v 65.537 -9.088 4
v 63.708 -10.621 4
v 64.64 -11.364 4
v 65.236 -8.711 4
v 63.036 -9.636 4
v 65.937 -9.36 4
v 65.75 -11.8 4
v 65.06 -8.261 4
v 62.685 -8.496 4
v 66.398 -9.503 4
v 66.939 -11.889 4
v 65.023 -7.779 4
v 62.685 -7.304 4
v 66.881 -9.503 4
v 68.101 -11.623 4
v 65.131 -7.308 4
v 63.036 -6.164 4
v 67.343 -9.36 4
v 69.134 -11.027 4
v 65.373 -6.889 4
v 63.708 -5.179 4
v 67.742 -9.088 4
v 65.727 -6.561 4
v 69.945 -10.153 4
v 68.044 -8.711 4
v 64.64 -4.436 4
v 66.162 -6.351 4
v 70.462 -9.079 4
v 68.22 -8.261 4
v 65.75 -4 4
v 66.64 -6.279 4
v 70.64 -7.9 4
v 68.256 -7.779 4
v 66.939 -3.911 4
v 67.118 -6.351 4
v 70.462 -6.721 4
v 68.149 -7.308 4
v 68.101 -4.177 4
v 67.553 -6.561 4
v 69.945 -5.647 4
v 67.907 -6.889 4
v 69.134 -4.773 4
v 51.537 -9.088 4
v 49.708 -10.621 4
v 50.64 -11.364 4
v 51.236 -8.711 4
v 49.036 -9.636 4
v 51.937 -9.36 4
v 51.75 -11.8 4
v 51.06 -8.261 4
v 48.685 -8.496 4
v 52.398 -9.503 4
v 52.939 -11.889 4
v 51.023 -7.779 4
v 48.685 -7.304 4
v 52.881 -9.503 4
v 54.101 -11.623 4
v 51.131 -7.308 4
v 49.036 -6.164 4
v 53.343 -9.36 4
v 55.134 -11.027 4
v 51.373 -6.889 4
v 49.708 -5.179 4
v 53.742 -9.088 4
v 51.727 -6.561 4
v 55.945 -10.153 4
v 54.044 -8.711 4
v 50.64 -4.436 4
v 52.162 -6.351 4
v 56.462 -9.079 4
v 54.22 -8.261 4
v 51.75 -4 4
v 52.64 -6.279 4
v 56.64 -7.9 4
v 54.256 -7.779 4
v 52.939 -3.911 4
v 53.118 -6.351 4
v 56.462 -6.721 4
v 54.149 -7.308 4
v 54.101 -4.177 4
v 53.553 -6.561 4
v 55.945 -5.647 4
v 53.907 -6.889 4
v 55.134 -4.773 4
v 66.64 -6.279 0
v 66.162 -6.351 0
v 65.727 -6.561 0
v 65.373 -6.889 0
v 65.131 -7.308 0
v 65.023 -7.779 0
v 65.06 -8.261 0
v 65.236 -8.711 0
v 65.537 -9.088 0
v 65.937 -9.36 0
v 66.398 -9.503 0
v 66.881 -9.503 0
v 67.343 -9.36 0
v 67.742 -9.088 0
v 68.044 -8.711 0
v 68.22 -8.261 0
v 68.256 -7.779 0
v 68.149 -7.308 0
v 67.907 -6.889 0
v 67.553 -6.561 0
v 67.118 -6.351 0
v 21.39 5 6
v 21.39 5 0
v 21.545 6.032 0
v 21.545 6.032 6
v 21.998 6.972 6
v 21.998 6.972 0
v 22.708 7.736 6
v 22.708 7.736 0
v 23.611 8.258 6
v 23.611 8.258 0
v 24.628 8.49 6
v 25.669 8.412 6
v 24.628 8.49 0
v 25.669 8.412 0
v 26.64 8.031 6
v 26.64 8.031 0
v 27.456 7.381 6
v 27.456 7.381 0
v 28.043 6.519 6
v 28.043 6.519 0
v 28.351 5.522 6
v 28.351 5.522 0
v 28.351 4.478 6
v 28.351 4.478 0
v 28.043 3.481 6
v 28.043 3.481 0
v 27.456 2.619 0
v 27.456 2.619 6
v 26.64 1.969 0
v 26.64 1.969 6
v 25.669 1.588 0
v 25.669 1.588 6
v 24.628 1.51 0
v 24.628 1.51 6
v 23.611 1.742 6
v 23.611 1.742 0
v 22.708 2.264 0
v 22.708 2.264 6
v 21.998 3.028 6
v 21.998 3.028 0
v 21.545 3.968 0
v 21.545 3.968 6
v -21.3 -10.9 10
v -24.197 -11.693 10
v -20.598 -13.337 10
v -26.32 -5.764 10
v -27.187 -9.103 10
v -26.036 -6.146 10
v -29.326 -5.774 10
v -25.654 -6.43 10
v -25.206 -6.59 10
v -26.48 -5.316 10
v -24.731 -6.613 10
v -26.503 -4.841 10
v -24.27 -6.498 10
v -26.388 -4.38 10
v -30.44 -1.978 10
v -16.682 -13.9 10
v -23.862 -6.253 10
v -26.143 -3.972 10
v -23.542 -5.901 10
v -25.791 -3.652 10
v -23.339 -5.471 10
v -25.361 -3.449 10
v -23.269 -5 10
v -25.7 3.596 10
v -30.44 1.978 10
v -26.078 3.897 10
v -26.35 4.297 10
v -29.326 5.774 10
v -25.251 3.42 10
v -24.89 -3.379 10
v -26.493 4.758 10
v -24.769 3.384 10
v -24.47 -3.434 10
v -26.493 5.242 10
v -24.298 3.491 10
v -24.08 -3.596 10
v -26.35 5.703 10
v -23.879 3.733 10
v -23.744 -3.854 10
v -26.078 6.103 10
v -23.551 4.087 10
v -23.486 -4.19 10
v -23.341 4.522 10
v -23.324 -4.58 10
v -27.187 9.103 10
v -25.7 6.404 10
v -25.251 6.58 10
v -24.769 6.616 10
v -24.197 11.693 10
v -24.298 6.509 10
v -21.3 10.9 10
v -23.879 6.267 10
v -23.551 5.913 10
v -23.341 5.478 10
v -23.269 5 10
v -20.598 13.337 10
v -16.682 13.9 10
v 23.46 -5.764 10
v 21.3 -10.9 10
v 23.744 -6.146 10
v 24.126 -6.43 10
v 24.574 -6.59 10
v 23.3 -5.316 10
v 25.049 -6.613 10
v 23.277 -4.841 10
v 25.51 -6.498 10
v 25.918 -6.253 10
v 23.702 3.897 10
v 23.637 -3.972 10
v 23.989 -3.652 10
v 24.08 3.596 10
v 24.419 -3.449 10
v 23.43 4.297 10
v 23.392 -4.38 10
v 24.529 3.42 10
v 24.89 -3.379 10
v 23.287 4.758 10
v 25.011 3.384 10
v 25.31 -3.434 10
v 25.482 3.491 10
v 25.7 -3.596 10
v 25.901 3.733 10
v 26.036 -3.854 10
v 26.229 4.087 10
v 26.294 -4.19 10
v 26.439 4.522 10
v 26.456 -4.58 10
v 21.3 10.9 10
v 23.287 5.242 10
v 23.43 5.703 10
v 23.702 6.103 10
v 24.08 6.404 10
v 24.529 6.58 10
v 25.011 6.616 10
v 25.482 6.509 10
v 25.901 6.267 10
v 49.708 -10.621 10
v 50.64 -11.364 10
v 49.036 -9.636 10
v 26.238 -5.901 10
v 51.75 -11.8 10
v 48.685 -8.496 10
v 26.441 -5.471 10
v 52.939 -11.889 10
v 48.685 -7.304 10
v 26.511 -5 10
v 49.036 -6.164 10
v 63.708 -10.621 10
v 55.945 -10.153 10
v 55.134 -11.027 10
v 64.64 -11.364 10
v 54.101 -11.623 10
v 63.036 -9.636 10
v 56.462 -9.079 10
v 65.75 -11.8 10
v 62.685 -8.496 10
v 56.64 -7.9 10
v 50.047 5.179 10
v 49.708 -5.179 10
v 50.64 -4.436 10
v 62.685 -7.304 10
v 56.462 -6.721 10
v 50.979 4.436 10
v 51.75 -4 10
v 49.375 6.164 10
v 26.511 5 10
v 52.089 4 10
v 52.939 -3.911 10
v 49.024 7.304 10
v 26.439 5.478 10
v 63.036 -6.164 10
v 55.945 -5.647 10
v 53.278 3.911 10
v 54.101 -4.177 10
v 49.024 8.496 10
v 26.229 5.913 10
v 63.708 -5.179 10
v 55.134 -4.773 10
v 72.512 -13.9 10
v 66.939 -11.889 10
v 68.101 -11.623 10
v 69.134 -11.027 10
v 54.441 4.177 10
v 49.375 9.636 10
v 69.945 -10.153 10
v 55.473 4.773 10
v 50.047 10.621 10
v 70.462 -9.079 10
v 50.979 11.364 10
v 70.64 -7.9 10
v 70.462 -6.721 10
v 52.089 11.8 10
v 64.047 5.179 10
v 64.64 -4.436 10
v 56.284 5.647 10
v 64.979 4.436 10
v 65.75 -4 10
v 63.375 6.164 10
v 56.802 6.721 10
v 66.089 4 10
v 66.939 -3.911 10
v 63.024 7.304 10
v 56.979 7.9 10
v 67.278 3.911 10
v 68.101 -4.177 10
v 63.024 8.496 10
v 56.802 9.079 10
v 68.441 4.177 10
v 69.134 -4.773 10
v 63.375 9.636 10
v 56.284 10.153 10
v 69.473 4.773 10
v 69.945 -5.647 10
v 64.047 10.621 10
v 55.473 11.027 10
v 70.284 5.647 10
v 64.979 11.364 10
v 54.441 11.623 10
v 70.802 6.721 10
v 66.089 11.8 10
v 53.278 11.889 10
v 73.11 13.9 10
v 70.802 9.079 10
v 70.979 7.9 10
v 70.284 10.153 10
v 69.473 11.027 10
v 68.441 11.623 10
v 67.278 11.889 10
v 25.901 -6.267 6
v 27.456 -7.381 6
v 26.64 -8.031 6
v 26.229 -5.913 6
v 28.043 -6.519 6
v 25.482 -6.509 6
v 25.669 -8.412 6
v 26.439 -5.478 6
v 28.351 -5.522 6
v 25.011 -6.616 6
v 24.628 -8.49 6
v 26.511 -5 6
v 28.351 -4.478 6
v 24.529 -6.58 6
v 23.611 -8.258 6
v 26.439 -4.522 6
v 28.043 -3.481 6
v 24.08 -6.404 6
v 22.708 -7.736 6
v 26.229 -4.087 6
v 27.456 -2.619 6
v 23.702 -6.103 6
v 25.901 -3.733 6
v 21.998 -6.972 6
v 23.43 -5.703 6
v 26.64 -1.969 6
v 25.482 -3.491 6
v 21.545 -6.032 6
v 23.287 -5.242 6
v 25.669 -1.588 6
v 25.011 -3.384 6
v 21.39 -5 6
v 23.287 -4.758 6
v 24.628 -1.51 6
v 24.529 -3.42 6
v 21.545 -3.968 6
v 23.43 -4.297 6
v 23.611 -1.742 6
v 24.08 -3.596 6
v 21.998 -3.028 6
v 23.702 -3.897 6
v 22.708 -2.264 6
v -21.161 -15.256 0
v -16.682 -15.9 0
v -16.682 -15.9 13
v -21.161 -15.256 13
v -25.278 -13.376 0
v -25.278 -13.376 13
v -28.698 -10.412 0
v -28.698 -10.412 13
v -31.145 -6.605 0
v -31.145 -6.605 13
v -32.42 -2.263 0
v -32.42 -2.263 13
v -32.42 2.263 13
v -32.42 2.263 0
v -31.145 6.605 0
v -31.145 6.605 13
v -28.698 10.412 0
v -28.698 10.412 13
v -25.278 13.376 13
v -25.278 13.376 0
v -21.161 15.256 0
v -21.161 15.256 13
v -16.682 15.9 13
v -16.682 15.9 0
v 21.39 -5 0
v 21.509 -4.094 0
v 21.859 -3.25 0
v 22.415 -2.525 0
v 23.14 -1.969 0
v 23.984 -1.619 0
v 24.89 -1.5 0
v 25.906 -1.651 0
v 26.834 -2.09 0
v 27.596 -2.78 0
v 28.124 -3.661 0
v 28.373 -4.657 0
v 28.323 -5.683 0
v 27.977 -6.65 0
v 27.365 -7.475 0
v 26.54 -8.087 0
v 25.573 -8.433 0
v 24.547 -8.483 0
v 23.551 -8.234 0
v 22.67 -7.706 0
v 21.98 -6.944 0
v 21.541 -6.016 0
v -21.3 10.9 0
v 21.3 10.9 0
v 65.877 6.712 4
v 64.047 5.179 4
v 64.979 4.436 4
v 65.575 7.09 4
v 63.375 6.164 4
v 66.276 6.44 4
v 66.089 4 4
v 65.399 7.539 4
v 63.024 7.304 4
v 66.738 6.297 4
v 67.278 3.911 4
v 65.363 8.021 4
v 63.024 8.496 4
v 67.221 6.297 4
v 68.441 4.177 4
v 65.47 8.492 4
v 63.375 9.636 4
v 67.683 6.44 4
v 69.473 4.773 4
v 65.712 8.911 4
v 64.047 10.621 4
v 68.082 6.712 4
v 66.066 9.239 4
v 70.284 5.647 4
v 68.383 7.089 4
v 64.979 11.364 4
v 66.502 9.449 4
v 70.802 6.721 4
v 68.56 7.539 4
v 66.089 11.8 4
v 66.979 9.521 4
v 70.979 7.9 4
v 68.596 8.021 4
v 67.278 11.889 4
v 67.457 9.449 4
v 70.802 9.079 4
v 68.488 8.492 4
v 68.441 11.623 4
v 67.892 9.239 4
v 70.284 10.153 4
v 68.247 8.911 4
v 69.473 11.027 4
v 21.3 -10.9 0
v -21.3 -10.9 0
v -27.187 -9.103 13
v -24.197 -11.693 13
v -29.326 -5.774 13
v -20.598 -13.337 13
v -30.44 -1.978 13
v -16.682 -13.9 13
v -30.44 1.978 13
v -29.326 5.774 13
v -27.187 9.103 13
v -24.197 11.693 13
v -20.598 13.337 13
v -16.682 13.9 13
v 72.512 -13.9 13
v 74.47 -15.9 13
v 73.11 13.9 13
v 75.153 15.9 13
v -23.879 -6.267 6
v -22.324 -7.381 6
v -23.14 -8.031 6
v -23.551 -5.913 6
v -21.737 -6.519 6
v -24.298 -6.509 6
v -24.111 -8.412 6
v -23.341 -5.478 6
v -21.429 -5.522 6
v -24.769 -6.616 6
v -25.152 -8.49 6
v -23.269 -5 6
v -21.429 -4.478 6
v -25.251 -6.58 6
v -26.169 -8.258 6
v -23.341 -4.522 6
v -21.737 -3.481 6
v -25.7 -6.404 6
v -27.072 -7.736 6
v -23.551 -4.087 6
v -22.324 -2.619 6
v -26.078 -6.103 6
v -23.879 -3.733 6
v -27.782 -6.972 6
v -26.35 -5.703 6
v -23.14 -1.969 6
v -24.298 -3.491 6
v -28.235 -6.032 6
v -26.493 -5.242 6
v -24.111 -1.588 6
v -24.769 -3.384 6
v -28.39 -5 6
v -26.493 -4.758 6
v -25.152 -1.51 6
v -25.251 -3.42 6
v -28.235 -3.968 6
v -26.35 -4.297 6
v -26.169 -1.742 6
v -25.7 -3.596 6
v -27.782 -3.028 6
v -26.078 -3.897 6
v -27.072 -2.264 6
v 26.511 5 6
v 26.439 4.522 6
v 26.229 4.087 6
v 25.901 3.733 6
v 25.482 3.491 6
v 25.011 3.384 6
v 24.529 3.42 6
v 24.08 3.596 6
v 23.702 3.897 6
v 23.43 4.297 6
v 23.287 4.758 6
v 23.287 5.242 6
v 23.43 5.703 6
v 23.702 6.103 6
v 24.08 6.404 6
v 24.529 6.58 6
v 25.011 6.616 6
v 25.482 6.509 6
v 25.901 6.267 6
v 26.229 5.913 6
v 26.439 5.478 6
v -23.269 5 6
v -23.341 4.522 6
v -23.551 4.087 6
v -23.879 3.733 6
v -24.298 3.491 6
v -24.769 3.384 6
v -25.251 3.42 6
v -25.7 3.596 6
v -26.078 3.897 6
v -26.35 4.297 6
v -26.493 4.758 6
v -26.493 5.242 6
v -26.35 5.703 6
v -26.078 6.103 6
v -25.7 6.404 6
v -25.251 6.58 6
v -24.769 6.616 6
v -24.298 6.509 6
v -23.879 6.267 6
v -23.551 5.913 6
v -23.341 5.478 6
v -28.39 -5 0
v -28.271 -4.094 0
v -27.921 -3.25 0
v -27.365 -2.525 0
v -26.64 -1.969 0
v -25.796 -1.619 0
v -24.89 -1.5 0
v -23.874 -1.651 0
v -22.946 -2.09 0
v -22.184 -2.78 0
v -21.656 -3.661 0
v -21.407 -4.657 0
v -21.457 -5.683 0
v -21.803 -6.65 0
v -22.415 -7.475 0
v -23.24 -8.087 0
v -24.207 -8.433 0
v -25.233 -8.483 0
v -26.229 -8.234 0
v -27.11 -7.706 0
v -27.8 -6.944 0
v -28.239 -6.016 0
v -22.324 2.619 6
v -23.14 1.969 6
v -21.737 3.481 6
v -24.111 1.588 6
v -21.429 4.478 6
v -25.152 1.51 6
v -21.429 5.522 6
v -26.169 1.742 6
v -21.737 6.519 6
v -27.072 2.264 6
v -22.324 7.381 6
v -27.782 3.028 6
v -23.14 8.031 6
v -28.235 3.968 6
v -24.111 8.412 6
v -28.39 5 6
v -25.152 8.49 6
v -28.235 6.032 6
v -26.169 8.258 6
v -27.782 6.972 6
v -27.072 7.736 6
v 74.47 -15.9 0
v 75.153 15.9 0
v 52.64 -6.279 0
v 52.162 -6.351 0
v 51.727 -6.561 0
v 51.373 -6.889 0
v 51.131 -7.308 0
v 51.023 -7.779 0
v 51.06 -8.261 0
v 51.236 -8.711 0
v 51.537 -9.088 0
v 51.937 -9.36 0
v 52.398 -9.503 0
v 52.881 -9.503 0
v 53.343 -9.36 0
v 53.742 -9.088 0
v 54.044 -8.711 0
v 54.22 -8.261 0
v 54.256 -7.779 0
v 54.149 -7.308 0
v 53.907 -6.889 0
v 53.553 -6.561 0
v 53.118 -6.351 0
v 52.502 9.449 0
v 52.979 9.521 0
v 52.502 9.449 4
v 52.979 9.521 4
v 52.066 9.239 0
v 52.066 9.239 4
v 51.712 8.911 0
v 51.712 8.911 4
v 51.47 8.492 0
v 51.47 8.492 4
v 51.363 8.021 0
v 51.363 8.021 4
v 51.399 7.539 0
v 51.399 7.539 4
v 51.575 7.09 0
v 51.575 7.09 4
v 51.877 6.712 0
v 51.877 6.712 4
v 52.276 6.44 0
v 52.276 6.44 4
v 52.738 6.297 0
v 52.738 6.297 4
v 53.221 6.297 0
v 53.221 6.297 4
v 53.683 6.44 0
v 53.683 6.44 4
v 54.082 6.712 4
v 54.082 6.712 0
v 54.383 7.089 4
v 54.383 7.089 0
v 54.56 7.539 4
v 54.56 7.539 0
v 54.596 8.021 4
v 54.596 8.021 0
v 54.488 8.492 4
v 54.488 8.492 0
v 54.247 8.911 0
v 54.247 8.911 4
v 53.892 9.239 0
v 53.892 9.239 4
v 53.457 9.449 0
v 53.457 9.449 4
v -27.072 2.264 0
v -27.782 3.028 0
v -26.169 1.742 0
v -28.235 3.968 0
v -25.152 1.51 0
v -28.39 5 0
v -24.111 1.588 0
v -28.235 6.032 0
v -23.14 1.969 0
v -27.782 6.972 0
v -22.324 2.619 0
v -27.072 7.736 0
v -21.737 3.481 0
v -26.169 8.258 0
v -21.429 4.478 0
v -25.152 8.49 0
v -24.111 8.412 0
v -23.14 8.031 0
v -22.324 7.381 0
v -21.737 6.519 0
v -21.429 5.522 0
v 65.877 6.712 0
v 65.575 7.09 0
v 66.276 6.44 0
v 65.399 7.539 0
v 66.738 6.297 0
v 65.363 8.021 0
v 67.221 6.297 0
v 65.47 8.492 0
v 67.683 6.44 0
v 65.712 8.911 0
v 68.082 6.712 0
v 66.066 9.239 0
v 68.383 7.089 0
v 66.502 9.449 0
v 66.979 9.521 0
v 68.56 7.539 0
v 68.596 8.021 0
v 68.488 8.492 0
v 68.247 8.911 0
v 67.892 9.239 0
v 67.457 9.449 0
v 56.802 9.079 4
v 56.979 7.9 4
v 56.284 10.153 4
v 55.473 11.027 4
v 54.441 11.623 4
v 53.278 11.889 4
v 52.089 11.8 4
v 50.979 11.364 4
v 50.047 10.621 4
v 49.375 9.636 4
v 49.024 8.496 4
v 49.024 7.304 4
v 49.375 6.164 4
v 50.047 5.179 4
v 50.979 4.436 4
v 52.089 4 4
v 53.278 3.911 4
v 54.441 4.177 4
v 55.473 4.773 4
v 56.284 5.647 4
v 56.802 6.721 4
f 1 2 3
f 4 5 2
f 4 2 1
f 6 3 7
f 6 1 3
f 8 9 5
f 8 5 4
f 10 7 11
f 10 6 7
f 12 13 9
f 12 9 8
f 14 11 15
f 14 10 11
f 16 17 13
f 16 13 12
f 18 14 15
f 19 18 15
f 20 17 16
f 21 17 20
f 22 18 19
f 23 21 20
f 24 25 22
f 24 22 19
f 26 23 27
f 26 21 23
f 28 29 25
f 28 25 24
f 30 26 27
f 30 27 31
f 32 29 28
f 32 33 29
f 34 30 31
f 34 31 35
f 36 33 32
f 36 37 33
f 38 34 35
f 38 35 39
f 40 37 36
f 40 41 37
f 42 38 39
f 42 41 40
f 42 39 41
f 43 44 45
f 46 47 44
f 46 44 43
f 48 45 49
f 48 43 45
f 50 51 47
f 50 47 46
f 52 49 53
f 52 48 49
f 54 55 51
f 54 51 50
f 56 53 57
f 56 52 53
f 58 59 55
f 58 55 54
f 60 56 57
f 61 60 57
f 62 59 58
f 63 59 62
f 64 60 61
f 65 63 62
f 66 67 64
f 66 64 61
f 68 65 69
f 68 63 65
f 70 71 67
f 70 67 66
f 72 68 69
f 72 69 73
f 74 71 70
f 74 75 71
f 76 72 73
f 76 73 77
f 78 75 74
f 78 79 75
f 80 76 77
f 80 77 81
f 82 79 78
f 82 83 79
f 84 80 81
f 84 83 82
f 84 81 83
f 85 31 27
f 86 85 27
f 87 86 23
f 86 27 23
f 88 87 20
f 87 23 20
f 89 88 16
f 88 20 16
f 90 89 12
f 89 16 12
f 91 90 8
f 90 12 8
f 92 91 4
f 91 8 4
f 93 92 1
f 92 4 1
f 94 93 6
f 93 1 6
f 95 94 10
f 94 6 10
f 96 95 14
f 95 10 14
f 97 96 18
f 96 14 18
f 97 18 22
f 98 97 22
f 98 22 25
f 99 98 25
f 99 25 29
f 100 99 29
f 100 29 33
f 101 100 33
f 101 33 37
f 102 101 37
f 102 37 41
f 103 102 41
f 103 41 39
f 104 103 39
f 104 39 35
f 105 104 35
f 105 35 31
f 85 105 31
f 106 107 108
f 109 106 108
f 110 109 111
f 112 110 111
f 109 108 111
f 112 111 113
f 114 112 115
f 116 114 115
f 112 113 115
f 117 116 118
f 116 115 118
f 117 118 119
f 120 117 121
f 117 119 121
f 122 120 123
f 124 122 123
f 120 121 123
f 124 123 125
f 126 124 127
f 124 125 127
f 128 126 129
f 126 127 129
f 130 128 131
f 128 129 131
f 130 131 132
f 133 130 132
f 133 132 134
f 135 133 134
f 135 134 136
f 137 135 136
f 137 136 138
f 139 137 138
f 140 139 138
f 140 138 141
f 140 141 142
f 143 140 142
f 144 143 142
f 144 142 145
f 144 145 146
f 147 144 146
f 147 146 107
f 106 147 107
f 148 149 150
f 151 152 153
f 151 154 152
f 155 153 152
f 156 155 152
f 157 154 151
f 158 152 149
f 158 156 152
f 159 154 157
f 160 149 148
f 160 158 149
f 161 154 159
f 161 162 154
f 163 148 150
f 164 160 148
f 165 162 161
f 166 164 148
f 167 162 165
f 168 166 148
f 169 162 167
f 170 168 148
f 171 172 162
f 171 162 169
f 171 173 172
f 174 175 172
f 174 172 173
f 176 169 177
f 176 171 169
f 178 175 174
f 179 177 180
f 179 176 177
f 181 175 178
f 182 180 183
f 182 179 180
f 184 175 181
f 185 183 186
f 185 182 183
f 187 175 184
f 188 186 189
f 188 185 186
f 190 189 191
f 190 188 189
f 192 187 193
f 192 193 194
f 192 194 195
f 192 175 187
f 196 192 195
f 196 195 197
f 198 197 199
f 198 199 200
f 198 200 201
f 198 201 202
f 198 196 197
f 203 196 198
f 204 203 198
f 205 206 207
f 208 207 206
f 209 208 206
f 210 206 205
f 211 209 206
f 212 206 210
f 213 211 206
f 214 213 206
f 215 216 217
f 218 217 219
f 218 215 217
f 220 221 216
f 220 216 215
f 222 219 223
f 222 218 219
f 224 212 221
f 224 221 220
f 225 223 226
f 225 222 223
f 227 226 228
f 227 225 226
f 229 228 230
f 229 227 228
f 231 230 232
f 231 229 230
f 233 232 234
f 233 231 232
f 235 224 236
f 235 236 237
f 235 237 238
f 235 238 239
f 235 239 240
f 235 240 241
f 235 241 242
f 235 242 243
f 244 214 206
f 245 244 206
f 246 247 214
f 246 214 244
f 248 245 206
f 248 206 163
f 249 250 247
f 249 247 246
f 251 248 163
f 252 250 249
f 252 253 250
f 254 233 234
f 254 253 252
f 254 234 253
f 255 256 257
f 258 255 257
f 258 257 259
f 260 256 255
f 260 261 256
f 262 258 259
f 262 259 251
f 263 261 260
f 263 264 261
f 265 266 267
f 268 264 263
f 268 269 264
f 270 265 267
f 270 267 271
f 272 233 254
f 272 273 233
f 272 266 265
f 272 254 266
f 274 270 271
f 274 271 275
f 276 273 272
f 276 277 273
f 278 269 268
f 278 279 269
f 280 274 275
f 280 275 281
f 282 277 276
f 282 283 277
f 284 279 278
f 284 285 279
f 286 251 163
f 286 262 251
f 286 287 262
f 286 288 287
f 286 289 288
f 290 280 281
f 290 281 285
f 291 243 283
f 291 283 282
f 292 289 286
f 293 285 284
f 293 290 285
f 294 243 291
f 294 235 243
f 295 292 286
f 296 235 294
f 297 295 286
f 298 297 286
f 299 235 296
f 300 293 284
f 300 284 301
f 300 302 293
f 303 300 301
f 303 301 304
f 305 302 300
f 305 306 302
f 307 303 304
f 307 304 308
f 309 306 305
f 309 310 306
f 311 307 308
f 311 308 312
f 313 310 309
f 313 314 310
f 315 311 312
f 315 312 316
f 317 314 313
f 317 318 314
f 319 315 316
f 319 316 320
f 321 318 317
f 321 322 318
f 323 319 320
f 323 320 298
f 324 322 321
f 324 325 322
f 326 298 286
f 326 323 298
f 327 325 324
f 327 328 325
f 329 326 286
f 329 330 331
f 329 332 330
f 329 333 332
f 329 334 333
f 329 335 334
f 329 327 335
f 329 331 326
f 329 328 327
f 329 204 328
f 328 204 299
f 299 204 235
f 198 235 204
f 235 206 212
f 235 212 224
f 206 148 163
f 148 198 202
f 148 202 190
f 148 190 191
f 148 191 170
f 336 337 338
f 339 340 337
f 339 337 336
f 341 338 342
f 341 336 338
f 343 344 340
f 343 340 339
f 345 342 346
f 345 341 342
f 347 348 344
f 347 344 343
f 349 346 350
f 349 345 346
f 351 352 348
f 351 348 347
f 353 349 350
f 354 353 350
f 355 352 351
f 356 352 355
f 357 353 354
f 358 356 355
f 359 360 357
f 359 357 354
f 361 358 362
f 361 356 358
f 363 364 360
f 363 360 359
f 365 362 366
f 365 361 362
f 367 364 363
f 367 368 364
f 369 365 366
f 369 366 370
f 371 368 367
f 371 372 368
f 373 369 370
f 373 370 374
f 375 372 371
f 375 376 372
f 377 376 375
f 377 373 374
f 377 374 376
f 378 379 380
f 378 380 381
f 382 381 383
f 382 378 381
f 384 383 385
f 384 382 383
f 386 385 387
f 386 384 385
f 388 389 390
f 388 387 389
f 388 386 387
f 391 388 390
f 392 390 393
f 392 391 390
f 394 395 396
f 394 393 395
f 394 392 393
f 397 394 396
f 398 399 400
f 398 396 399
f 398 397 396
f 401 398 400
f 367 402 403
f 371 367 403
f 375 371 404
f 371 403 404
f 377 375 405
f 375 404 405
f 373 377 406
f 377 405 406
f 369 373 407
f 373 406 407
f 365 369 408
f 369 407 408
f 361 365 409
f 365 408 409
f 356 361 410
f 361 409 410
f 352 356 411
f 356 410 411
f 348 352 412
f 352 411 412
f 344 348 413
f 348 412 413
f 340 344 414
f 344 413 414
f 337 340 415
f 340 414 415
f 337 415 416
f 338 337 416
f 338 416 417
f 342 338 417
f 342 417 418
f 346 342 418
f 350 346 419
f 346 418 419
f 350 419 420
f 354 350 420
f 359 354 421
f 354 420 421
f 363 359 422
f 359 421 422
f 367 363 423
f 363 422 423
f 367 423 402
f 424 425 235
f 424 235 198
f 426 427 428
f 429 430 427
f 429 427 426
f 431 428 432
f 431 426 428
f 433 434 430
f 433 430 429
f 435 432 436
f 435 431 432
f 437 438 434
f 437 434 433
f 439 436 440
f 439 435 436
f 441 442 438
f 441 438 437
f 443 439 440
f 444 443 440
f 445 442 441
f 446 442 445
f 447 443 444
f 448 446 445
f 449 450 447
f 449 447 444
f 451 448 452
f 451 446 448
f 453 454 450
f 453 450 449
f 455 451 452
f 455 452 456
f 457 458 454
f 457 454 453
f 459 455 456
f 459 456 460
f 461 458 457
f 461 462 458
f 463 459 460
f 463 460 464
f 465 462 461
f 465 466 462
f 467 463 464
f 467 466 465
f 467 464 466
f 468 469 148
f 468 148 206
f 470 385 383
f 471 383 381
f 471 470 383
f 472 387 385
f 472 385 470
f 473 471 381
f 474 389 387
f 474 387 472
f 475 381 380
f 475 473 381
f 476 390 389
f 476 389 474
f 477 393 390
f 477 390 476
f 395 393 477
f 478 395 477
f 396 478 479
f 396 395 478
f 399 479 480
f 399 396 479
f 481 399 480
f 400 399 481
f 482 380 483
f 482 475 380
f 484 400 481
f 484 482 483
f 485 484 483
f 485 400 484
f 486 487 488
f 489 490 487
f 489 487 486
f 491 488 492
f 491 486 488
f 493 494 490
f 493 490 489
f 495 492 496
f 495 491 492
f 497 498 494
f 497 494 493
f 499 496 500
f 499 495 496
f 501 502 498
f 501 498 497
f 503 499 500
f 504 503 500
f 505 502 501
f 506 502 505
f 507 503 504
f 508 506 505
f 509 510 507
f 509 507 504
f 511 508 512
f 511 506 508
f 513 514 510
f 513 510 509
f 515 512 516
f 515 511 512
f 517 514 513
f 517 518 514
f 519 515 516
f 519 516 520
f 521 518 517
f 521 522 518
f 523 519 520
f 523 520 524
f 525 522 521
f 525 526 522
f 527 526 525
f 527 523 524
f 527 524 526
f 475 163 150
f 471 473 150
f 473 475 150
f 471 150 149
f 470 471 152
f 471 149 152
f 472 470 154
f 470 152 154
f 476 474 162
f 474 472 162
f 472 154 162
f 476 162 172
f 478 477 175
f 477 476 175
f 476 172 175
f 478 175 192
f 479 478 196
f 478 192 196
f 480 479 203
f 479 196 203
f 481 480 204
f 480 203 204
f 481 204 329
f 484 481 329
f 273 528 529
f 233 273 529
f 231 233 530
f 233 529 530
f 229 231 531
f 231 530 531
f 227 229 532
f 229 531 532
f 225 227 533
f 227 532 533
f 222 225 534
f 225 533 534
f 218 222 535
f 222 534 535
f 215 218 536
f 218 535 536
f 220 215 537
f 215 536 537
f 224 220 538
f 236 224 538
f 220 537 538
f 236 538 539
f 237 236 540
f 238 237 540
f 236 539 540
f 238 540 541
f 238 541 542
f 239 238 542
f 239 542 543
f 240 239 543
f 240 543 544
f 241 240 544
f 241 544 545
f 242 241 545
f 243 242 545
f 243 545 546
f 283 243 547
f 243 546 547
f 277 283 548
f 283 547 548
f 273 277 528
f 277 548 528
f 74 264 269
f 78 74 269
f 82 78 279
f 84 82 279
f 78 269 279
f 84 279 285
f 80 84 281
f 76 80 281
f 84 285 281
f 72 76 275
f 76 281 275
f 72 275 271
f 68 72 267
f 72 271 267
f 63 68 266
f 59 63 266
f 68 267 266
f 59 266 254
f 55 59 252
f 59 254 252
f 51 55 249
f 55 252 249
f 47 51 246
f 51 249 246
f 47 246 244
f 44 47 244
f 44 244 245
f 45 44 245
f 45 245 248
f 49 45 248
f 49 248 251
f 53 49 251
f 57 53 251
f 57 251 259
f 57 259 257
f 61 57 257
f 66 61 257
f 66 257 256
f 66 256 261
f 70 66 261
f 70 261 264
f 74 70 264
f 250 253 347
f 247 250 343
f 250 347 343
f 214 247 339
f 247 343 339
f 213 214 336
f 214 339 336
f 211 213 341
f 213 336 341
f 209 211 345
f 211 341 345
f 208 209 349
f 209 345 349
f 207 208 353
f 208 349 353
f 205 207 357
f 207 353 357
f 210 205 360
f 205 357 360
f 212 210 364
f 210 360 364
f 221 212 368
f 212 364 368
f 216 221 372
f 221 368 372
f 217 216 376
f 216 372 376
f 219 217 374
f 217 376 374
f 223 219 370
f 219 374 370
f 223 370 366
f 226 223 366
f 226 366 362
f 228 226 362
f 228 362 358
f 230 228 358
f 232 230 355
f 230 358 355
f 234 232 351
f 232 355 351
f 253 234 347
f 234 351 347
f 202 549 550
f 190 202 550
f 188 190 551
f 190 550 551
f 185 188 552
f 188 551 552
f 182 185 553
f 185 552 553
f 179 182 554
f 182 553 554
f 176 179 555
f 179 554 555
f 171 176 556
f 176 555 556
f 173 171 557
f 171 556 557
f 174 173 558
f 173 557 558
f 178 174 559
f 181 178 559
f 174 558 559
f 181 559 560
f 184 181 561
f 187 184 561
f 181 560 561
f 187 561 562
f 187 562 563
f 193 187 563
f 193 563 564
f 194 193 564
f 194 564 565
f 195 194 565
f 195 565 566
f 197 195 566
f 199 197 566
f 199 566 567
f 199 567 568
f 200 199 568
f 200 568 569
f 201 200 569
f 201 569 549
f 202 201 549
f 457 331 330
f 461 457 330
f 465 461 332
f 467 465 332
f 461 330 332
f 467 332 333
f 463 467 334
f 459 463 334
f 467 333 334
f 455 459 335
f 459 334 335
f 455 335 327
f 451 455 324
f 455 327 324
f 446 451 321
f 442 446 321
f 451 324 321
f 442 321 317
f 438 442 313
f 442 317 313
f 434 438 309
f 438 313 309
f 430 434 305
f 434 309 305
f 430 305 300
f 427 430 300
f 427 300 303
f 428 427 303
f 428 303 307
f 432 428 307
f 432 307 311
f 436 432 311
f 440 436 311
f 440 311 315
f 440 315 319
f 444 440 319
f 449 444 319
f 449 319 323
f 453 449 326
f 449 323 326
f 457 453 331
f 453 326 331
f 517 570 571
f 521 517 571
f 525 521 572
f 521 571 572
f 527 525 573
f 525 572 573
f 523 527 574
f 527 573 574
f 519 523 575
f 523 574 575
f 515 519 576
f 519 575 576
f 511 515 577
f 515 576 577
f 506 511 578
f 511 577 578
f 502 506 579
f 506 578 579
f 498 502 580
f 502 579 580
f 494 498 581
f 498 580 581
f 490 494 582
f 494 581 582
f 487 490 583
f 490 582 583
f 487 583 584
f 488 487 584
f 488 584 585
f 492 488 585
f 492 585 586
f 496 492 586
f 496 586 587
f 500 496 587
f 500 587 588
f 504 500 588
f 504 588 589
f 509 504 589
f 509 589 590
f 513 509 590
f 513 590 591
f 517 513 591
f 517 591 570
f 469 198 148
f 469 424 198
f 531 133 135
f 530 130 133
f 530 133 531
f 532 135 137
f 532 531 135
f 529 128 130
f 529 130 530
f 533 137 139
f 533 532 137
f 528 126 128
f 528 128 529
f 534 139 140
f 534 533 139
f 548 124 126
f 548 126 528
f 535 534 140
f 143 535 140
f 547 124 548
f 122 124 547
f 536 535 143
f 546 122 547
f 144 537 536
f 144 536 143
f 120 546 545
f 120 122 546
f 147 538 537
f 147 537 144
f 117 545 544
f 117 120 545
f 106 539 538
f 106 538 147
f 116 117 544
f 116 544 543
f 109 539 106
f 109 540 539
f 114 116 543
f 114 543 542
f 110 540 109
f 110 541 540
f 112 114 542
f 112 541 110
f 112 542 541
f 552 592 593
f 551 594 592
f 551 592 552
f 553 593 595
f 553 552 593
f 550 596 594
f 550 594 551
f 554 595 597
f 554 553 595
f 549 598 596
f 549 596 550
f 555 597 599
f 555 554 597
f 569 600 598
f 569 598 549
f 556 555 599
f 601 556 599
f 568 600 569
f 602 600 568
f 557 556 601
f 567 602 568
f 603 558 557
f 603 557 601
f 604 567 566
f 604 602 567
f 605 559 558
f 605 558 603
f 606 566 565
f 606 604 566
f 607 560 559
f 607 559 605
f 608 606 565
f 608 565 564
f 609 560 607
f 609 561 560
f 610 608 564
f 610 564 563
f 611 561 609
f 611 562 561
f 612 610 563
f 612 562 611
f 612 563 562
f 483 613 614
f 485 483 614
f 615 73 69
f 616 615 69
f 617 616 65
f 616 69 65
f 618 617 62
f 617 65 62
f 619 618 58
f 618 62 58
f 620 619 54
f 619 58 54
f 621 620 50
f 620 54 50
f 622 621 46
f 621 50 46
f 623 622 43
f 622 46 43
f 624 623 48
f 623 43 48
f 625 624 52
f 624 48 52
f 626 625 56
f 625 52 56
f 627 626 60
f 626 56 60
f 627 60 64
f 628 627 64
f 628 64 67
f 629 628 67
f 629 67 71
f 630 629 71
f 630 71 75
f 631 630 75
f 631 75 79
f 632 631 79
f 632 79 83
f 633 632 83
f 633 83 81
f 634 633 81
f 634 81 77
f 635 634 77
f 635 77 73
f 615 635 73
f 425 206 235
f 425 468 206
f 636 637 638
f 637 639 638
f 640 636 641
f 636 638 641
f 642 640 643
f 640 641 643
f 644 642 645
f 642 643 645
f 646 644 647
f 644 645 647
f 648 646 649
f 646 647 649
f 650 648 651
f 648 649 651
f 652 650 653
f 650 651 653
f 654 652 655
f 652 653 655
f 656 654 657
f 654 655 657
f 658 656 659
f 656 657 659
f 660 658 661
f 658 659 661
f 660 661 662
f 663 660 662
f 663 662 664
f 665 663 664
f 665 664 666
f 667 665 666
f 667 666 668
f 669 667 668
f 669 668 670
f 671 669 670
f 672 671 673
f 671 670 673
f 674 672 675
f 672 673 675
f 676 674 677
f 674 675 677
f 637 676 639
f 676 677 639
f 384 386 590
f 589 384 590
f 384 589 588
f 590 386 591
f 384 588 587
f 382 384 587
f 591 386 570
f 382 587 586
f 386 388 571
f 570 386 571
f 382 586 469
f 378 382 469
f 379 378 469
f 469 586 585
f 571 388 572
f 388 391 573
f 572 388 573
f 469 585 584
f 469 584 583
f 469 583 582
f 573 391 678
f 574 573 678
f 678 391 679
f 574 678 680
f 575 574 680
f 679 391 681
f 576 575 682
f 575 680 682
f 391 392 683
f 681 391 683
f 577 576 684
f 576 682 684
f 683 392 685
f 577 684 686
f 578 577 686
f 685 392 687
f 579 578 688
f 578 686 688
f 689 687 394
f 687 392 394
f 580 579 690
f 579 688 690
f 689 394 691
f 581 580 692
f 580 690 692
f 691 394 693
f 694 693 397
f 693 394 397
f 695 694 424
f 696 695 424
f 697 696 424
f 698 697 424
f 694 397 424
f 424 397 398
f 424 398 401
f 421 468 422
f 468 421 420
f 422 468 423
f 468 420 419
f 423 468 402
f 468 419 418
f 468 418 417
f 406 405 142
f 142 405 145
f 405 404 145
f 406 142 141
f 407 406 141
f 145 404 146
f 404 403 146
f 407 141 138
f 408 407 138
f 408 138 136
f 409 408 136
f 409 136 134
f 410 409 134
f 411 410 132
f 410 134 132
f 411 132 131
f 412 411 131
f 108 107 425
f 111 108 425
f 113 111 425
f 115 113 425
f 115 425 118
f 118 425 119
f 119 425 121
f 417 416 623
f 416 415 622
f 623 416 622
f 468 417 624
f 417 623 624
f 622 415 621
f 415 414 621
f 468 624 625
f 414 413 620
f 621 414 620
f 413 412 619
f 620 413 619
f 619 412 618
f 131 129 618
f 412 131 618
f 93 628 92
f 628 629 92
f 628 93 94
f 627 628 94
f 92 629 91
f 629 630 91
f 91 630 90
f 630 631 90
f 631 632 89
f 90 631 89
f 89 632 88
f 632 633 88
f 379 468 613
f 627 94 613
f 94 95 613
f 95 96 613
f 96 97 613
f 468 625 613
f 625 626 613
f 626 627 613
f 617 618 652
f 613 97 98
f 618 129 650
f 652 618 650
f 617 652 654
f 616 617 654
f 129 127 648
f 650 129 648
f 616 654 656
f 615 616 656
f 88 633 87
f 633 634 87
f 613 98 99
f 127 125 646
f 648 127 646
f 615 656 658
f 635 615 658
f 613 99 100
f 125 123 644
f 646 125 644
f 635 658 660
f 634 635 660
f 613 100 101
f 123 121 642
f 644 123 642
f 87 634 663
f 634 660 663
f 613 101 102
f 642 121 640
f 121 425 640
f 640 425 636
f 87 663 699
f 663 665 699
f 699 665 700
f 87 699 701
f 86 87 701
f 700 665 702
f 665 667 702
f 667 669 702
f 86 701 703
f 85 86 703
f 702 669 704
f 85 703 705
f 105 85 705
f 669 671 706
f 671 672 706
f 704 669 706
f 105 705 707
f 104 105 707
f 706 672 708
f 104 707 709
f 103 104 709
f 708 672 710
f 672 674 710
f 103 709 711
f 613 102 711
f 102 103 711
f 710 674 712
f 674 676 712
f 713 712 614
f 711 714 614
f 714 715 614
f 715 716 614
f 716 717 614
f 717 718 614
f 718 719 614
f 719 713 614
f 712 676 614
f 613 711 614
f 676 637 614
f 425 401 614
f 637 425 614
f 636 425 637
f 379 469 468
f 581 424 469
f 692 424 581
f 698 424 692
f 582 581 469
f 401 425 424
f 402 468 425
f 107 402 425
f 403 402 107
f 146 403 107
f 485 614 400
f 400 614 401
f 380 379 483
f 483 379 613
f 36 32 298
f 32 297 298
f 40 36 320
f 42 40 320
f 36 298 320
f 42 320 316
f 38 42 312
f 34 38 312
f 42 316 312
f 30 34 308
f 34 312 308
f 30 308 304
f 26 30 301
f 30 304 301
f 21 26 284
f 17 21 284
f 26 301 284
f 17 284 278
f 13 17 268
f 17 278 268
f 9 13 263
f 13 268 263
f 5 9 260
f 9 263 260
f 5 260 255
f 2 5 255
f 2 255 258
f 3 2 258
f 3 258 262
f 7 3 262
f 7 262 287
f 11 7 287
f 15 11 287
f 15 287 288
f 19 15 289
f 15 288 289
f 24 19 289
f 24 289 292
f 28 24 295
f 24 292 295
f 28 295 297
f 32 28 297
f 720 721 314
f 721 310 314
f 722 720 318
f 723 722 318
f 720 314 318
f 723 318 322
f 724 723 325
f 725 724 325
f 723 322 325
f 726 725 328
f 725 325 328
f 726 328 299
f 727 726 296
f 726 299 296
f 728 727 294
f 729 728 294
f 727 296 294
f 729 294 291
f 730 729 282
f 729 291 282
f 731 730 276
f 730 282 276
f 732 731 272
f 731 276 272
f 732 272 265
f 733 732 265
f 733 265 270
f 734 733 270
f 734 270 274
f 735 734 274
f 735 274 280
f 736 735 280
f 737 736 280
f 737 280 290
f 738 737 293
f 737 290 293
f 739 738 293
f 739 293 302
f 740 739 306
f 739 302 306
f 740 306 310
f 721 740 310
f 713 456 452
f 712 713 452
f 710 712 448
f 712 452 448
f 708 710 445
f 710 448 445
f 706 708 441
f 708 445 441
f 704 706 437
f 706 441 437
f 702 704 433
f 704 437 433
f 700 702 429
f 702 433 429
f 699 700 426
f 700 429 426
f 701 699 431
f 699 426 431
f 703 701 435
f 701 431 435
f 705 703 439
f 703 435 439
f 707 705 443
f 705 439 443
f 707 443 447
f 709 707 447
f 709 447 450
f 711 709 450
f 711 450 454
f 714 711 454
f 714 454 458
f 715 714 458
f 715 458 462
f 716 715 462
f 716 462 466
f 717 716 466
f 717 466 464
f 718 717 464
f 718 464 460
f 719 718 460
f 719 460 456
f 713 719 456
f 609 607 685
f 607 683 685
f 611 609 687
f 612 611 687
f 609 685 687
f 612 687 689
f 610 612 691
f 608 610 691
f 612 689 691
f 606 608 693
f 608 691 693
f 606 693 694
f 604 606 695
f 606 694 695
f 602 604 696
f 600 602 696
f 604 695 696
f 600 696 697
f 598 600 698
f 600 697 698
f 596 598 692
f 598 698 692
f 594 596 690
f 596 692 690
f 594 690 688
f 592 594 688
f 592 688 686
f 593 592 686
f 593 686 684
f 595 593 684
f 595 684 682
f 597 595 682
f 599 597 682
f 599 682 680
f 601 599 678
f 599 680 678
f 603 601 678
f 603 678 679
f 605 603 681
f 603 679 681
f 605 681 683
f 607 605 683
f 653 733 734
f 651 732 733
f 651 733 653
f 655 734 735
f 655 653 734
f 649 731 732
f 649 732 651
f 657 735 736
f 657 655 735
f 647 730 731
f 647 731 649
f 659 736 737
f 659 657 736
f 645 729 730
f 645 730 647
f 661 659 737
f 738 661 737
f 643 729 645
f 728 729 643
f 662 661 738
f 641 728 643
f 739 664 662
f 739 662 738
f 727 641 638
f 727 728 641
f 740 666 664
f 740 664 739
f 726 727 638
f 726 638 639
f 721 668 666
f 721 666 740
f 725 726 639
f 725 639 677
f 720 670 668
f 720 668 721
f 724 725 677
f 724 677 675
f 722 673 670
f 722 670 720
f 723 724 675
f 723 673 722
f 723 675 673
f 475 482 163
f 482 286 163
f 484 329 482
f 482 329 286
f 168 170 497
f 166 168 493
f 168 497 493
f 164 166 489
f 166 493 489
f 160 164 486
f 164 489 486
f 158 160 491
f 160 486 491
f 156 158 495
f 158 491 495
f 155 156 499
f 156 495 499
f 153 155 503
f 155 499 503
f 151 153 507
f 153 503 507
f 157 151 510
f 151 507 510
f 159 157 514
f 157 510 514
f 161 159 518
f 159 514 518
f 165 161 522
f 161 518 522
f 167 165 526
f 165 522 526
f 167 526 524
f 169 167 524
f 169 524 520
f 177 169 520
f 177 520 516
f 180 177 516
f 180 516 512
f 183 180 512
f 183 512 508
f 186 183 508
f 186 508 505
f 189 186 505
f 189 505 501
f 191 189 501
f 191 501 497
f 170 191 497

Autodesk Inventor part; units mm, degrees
ref_plane "YZ Plane" through (0, 0, 0) normal (1, 0, 0) x (0, 1, 0)
ref_plane "XZ Plane" through (0, 0, 0) normal (0, 1, 0) x (-1, 0, 0)
ref_plane "XY Plane" through (0, 0, 0) normal (0, 0, 1) x (1, 0, 0)
sketch "Szkic1" plane through (0, 0, 0) normal (0, 0, 1) x (1, 0, 0)
  line L0 (20.3, -9.9) -> (-20.3, -9.9)
  line L1 (-20.3, -9.9) -> (-20.3, 9.9)
  line L2 (-20.3, 9.9) -> (20.3, 9.9)
  line L3 (20.3, 9.9) -> (20.3, -9.9)
  line L4 (20.3, -9.9) -> (-20.3, 9.9) construction
  line L5 (-20.3, -9.9) -> (20.3, 9.9) construction
  line L6 (21.3, 10.9) -> (-21.3, 10.9)
  line L7 (-21.3, 10.9) -> (-21.3, -10.9)
  line L8 (-21.3, -10.9) -> (21.3, -10.9)
  line L9 (21.3, -10.9) -> (21.3, 10.9)
  line L10 (0, 0) -> (24.89, 0)
  line L11 (24.89, 0) -> (24.89, 5)
  line L12 (24.89, 5) -> (24.89, -5)
  line L13 (0, 0) -> (-24.89, 0)
  line L14 (-24.89, 5) -> (-24.89, 0)
  line L15 (-24.89, 0) -> (-24.89, -5)
  circle A0 centre (-24.89, 5) radius 1.621
  circle A1 centre (-24.89, -5) radius 1.621
  circle A2 centre (24.89, -5) radius 1.621
  circle A3 centre (24.89, 5) radius 1.621
  line L16 (-26.511, 5) -> (-31.511, 5)
  line L17 (26.511, 5) -> (31.511, 5)
  line L18 (0, 10.9) -> (0, 15.9)
  line L19 (0, 15.9) -> (-16.6819, 15.9)
  line L20 (0, -10.9) -> (0, -15.9)
  line L21 (0, -15.9) -> (-16.6819, -15.9)
  line L22 (-31.511, -5.7364) -> (-31.511, 5.7364)
  line L23 (0, 15.9) -> (31.511, 15.9)
  line L24 (31.511, 15.9) -> (31.511, -15.9)
  line L25 (0, -15.9) -> (31.511, -15.9)
  circle A4 centre (-16.6819, 0) radius 15.9
  arc A5 (-32.5353, -15.867) -> (-31.511, -15.9) centre (-31.511, 0) ccw
  line L26 (31.511, -15.9) -> (74.4699, -15.9)
  line L27 (74.4699, -15.9) -> (75.153, 15.9)
  line L28 (75.153, 15.9) -> (31.511, 15.9)
  point P0 (15.7555, -15.9)
  point P1 (29.1703, -29.1056)
  dimension "d10" = 3.242
  dimension "d13" = 3.242
  dimension "d0" = 40.6
  dimension "d1" = 19.8
  dimension "d2" = 1
  dimension "d3" = 42.6
  dimension "d4" = 24.89
  dimension "d5" = 5
  dimension "d6" = 10
  dimension "d7" = 24.89
  dimension "d8" = 5
  dimension "d9" = 5
  dimension "d11" = 3.242
  dimension "d12" = 3.242
  dimension "d14" = 5
  dimension "d15" = 5
  dimension "d16" = 5
  dimension "d17" = 5
  dimension "d18" = 6.621
  dimension "d19" = 63.022
  dimension "d20" = 10.9
  dimension "d21" = 0
extrude "Wyciągnięcie proste1" add sketch "Szkic1" along normal blind 10 contours A4 L22 L16 A0 L14 L13 L7 L8 | L8 L20 L21 A4 | L10 L11 A3 L17 L24 L25 L20 L8 L9 | L9 L6 L18 L23 L24 L17 A3 L11 L10 | L13 L14 A0 L16 L22 A4 L6 L7 | A4 L22 | A4 L19 L18 L6 | L24 L28 L27 L26
sketch "Szkic16" plane through (0, 0, 10) normal (0, 0, 1) x (1, 0, 0)
  line L0 (75.153, 15.9) -> (-16.6819, 15.9) projected
  arc A0 (-16.6819, 15.9) -> (-16.6819, -15.9) centre (-16.6819, 0) ccw projected
  line L1 (-16.6819, -15.9) -> (74.4699, -15.9) projected
  line L2 (74.4699, -15.9) -> (75.153, 15.9) projected
  circle A1 centre (24.89, 5) radius 1.621 projected
  circle A2 centre (24.89, -5) radius 1.621 projected
  line L3 (21.3, 10.9) -> (21.3, -10.9) projected
  line L4 (21.3, -10.9) -> (-21.3, -10.9) projected
  line L5 (-21.3, -10.9) -> (-21.3, 10.9) projected
  line L6 (-21.3, 10.9) -> (21.3, 10.9) projected
  circle A3 centre (-24.89, -5) radius 1.621 projected
  circle A4 centre (-24.89, 5) radius 1.621 projected
  line L7 (-16.6819, 13.9) -> (73.1096, 13.9)
  line L8 (73.1096, 13.9) -> (72.5124, -13.9)
  line L9 (72.5124, -13.9) -> (-16.6819, -13.9)
  arc A5 (-16.6819, 13.9) -> (-16.6819, -13.9) centre (-16.6819, 0) ccw
  point P0 (0, 0)
  dimension "d89" = 2
extrude "Wyciągnięcie proste9" add sketch "Szkic16" along normal blind 3 contours L2 L1 A0 L0
sketch "Szkic18" plane through (0, 0, 0) normal (0, 0, -1) x (-1, 0, 0)
  line L0 (-75.153, 15.9) -> (16.6819, 15.9) projected
  line L1 (16.6819, -15.9) -> (-74.4699, -15.9) projected
  line L2 (-74.4699, -15.9) -> (-75.153, 15.9) projected
  point P0 (0, 0)
  point P1 (-66.9793, 7.9)
  point P2 (-66.6399, -7.9)
  point P3 (-52.9793, 7.9)
  point P4 (-52.6399, -7.9)
  dimension "d94" = 8
  dimension "d95" = 8
  dimension "d105" = 8
  dimension "d106" = 8
  dimension "d107" = 14
  dimension "d108" = 14
  dimension "d109" = 8
  dimension "d110" = 8
hole "Otwór3" at (66.9793, 7.9, 0) at (66.6399, -7.9, 0) at (52.9793, 7.9, 0) at (52.6399, -7.9, 0) direction (0, 0, 1) diameter 3.242 end through all thread size "M4x0.7" designation "M4" class "6H" standard "GB Metric profile"
sketch "Szkic19" plane through (0, 0, 10) normal (0, 0, 1) x (1, 0, 0)
  circle A0 centre (52.9793, 7.9) radius 1.621 projected
  circle A1 centre (66.9793, 7.9) radius 1.621 projected
  circle A2 centre (52.6399, -7.9) radius 1.621 projected
  circle A3 centre (52.9793, 7.9) radius 1.621 projected
  circle A4 centre (66.6399, -7.9) radius 1.621 projected
  circle A5 centre (66.9793, 7.9) radius 1.621 projected
  arc A6 (-16.6819, 13.9) -> (-16.6819, -13.9) centre (-16.6819, 0) ccw projected
  line L0 (-16.6819, -13.9) -> (72.5124, -13.9) projected
  line L1 (72.5124, -13.9) -> (73.1096, 13.9) projected
  line L2 (73.1096, 13.9) -> (-16.6819, 13.9) projected
  circle A7 centre (24.89, 5) radius 1.621 projected
  circle A8 centre (24.89, -5) radius 1.621 projected
  line L3 (21.3, 10.9) -> (21.3, -10.9) projected
  line L4 (21.3, -10.9) -> (-21.3, -10.9) projected
  line L5 (-21.3, -10.9) -> (-21.3, 10.9) projected
  line L6 (-21.3, 10.9) -> (21.3, 10.9) projected
  circle A9 centre (-24.89, -5) radius 1.621 projected
  circle A10 centre (-24.89, 5) radius 1.621 projected
  circle A11 centre (52.9793, 7.9) radius 4
  circle A12 centre (52.6399, -7.9) radius 4
  circle A13 centre (66.6399, -7.9) radius 4
  circle A14 centre (66.9793, 7.9) radius 4
  point P0 (0, 0)
  dimension "d111" = 8
  dimension "d112" = 8
  dimension "d113" = 8
  dimension "d114" = 8
extrude "Wyciągnięcie proste10" cut sketch "Szkic19" against normal blind 6 contours A2 | A11 | A12 | A13 | A14
sketch "Szkic20" plane through (0, 0, 0) normal (0, 0, -1) x (-1, 0, 0)
  circle A0 centre (-52.6399, -7.9) radius 1.621 projected
  circle A1 centre (-52.9793, 7.9) radius 1.621 projected
  circle A2 centre (-66.6399, -7.9) radius 1.621 projected
  circle A3 centre (-66.9793, 7.9) radius 1.621 projected
  line L0 (-75.153, 15.9) -> (16.6819, 15.9) projected
  line L1 (-74.4699, -15.9) -> (-75.153, 15.9) projected
  line L2 (16.6819, -15.9) -> (-74.4699, -15.9) projected
  arc A4 (16.6819, -15.9) -> (16.6819, 15.9) centre (16.6819, 0) ccw projected
  circle A5 centre (-24.89, 5) radius 1.621 projected
  circle A6 centre (-24.89, -5) radius 1.621 projected
  line L3 (-21.3, 10.9) -> (-21.3, -10.9) projected
  line L4 (21.3, 10.9) -> (-21.3, 10.9) projected
  line L5 (21.3, -10.9) -> (21.3, 10.9) projected
  line L6 (-21.3, -10.9) -> (21.3, -10.9) projected
  circle A7 centre (24.89, -5) radius 1.621 projected
  circle A8 centre (24.89, 5) radius 1.621 projected
  circle A9 centre (24.89, -5) radius 3.5
  circle A10 centre (24.89, 5) radius 3.5
  circle A11 centre (-24.89, -5) radius 3.5
  circle A12 centre (-24.89, 5) radius 3.5
  point P0 (0, 0)
  dimension "d117" = 7
  dimension "d118" = 7
  dimension "d119" = 7
  dimension "d120" = 7
extrude "Wyciągnięcie proste11" cut sketch "Szkic20" against normal blind 6 contours A5 | A6 | A7 | A8 | A9 | A10 | A11 | A12
equation "\"d13\" = d10"
equation "\"d11\" = d10"
equation "\"d12\" = d10"
properties part number "Ramie3_Drukowanie 3D"
